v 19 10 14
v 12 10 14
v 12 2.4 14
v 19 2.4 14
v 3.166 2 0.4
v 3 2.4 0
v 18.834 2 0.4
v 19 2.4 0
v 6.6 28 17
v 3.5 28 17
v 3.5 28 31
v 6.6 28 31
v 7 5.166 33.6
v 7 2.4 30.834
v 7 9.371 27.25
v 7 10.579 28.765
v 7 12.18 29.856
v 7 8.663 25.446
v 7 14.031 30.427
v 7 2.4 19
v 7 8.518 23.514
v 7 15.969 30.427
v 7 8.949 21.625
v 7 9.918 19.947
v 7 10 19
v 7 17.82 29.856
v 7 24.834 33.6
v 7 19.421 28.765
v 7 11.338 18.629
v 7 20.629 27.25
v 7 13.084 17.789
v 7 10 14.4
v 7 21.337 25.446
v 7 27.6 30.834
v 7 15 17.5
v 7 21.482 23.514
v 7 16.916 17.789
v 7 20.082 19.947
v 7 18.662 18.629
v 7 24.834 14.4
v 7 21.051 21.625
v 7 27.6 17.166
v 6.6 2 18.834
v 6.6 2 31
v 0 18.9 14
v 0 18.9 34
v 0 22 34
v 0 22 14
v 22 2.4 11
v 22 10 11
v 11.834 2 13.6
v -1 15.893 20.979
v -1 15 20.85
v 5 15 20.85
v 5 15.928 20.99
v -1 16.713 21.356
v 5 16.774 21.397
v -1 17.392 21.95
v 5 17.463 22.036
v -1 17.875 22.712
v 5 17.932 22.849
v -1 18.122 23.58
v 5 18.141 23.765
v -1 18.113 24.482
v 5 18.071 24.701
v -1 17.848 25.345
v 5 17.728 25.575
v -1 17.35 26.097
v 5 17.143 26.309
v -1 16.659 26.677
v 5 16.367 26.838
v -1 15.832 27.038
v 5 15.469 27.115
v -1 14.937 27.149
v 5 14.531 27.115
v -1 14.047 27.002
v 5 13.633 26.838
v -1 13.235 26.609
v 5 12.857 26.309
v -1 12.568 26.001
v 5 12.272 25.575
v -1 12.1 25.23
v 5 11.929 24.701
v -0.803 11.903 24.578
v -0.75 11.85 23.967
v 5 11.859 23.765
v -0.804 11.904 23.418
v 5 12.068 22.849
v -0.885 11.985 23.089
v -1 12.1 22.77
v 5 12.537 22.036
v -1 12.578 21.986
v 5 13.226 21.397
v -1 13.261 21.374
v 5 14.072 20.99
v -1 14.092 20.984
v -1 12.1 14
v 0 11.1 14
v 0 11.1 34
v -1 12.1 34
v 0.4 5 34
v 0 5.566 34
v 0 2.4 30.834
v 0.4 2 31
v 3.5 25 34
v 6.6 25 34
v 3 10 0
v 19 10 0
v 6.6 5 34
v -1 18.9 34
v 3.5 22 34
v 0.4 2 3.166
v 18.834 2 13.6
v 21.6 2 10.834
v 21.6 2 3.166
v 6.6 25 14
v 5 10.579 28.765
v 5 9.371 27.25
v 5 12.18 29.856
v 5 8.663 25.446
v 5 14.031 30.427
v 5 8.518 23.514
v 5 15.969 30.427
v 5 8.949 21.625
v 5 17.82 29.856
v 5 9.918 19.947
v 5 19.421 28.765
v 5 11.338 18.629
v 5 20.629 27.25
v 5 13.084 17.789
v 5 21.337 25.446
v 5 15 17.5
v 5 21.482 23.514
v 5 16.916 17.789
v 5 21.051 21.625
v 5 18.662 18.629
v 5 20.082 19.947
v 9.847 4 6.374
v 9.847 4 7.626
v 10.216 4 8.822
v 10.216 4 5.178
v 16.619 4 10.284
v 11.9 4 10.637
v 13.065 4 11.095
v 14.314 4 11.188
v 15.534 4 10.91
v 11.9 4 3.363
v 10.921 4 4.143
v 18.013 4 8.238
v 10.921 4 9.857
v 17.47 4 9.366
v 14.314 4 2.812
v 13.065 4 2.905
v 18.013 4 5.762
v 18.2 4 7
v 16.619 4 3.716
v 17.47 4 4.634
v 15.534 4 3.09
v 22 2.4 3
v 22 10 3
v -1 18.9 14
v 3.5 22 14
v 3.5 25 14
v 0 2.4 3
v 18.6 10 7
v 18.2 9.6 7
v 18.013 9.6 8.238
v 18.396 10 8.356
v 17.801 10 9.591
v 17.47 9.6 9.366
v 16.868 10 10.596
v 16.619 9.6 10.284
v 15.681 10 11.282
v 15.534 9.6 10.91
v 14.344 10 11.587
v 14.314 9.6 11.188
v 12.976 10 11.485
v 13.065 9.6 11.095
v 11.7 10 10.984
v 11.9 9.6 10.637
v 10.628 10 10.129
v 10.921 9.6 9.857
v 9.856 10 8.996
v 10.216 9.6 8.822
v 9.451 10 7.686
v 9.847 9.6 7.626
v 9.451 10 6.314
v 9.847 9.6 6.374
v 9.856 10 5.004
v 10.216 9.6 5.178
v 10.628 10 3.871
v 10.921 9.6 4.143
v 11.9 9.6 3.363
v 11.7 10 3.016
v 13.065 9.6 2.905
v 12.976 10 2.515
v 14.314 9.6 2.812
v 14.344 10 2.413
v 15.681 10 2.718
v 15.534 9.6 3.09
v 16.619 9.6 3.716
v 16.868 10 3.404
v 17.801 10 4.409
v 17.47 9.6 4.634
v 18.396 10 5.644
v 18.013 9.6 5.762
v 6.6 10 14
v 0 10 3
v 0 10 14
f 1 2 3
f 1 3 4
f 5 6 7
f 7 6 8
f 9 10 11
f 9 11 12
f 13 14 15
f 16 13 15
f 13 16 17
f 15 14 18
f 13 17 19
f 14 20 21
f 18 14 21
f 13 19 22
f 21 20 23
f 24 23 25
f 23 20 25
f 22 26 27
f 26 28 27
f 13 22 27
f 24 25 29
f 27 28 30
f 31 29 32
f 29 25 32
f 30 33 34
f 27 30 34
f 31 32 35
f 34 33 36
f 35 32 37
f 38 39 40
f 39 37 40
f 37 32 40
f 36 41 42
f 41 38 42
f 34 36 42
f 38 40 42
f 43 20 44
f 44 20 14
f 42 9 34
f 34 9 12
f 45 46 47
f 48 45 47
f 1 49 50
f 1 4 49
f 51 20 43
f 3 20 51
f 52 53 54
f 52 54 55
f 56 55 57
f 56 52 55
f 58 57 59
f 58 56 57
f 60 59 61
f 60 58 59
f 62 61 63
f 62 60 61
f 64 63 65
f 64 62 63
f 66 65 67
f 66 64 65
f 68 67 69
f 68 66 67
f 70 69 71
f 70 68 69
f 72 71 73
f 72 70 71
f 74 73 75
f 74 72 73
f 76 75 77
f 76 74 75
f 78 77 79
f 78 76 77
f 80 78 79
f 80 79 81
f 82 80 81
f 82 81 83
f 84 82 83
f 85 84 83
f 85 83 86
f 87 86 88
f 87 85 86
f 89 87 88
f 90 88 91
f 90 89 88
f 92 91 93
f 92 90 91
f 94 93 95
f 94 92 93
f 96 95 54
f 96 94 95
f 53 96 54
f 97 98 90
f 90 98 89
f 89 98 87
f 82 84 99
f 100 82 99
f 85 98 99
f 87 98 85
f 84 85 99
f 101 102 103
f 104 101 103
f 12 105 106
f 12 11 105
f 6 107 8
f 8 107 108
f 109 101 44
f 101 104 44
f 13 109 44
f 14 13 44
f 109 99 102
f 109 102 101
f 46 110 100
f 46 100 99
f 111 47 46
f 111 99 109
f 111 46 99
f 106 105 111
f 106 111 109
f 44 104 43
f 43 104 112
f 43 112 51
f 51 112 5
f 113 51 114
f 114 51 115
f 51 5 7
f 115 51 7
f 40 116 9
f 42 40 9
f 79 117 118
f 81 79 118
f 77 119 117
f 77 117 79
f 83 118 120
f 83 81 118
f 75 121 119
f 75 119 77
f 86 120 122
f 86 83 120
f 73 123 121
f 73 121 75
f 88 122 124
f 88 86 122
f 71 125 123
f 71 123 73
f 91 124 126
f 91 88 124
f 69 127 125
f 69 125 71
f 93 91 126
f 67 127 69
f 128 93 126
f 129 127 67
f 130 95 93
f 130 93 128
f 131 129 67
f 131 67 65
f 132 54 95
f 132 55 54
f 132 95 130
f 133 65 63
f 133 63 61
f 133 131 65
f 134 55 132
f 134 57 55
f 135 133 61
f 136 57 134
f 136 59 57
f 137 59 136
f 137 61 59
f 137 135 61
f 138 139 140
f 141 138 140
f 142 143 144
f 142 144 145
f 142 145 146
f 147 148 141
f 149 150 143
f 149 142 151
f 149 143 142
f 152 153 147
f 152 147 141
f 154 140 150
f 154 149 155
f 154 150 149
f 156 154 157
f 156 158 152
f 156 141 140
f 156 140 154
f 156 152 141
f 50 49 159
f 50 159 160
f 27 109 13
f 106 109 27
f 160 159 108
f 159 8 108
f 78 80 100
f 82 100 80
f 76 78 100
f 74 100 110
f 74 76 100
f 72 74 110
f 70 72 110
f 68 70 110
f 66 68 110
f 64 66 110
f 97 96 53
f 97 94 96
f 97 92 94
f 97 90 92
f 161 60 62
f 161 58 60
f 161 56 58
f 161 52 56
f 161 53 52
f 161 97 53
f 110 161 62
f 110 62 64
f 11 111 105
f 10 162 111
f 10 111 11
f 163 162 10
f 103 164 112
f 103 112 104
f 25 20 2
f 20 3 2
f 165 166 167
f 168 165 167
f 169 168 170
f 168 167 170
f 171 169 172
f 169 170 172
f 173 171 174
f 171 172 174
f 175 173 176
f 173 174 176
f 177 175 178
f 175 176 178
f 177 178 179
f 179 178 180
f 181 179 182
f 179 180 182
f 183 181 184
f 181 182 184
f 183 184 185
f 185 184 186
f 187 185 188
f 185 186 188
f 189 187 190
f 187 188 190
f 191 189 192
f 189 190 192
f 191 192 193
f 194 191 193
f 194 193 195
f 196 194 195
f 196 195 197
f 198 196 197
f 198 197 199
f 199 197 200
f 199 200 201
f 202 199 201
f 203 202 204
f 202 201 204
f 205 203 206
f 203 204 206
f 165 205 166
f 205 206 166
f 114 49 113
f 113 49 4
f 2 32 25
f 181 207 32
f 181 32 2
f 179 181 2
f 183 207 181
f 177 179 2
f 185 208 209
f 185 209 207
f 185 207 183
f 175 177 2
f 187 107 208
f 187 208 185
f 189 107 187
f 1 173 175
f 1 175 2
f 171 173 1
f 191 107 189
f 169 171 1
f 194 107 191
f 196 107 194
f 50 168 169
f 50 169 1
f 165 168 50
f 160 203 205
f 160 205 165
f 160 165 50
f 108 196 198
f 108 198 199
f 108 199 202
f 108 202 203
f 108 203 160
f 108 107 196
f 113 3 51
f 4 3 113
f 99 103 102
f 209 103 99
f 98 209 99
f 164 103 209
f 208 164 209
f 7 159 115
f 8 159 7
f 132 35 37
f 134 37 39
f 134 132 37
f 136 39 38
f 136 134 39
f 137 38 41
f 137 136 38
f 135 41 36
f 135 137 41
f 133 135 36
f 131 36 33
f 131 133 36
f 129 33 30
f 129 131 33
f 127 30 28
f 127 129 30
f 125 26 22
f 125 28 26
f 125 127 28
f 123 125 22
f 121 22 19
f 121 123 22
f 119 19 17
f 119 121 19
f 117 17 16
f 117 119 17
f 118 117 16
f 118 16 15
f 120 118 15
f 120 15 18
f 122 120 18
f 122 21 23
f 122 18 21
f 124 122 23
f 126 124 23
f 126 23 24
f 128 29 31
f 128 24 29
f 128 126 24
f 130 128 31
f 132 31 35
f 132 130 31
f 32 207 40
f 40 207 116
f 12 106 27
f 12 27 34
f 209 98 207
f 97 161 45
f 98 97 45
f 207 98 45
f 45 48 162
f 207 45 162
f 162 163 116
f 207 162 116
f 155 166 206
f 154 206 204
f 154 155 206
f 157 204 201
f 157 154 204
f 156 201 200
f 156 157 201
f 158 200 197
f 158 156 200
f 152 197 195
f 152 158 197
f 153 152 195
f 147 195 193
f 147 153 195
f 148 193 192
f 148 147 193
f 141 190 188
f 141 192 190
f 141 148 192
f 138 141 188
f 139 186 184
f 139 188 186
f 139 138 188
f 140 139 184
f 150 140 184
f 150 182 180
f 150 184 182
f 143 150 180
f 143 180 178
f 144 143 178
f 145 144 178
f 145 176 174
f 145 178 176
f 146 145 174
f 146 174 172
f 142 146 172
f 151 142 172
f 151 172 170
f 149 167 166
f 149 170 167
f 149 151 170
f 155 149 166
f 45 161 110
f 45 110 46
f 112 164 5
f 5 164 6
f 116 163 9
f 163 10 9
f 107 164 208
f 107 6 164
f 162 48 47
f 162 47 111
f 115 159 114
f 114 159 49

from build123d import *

# Parameters (mm, degrees)
CYLINDER_R        = 4.2
CYLINDER_DEPTH    = 10
CYLINDER001_R     = 6.5
CYLINDER001_DEPTH = 10
CYLINDER002_R     = 3.15
CYLINDER002_DEPTH = 10
BOX002_W          = 3.5
BOX002_H          = 8
BOX002_DEPTH      = 20
BOX001_W          = 7
BOX001_H          = 26
BOX001_DEPTH      = 20
CHAMFER004_SIZE   = 3
BOX003_W          = 2
BOX003_H          = 7.8
BOX003_DEPTH      = 20
CHAMFER003_SIZE   = 1
BOX_W             = 22
BOX_H             = 8
BOX_DEPTH         = 14
CHAMFER_SIZE      = 3
CHAMFER005_SIZE   = 5
CHAMFER006_SIZE   = 0.4


with BuildPart() as cylinder:
    # Cylinder → Cylinder (new body)
    with BuildSketch(Plane(origin=(14, 4, 7), x_dir=(1, 0, 0), z_dir=(0, 1, 0))):
        Circle(CYLINDER_R)
    extrude(amount=CYLINDER_DEPTH)


with BuildPart() as cylinder001:
    # Cylinder001 → Cylinder001 (new body)
    with BuildSketch(Plane(origin=(5, 15, 24), x_dir=(0, 0, -1), z_dir=(1, 0, 0))):
        Circle(CYLINDER001_R)
    extrude(amount=CYLINDER001_DEPTH)


with BuildPart() as fusion001:
    # Cylinder002 → Cylinder002 (new body)
    with BuildSketch(Plane(origin=(-2, 15, 24), x_dir=(0, 0, -1), z_dir=(1, 0, 0))):
        Circle(CYLINDER002_R)
    extrude(amount=CYLINDER002_DEPTH)

    # Fusion001: union Cylinder001
    add(cylinder001.part)


with BuildPart() as cube002:
    # Box002 → Box002 (new body)
    with BuildSketch(Plane(origin=(0, 22, 14), x_dir=(1, 0, 0), z_dir=(0, 0, 1))):
        with Locations((1.75, 4)):
            Rectangle(BOX002_W, BOX002_H)
    extrude(amount=BOX002_DEPTH)


with BuildPart() as chamfer004:
    # Box001 → Box001 (new body)
    with BuildSketch(Plane(origin=(0, 2, 14), x_dir=(1, 0, 0), z_dir=(0, 0, 1))):
        with Locations((3.5, 13)):
            Rectangle(BOX001_W, BOX001_H)
    extrude(amount=BOX001_DEPTH)

    # Cut: cut Cube002
    add(cube002.part, mode=Mode.SUBTRACT)

    # Chamfer004
    chamfer004_edges = [chamfer004.edges().sort_by_distance(p)[0] for p in [
        (5.25, 28, 34),
        (3.5, 2, 34),
        (5.25, 28, 14),
    ]]
    chamfer(chamfer004_edges, length=CHAMFER004_SIZE)


with BuildPart() as chamfer003:
    # Box003 → Box003 (new body)
    with BuildSketch(Plane(origin=(-1, 11.1, 14), x_dir=(1, 0, 0), z_dir=(0, 0, 1))):
        with Locations((1, 3.9)):
            Rectangle(BOX003_W, BOX003_H)
    extrude(amount=BOX003_DEPTH)

    # Chamfer003
    chamfer003_edges = [chamfer003.edges().sort_by_distance(p)[0] for p in [
        (-1, 11.1, 24),
    ]]
    chamfer(chamfer003_edges, length=CHAMFER003_SIZE)


with BuildPart() as chamfer006:
    # Box → Box (new body)
    with BuildSketch(Plane(origin=(0, 2, 0), x_dir=(1, 0, 0), z_dir=(0, 0, 1))):
        with Locations((11, 4)):
            Rectangle(BOX_W, BOX_H)
    extrude(amount=BOX_DEPTH)

    # Chamfer
    chamfer_edges = [chamfer006.edges().sort_by_distance(p)[0] for p in [
        (0, 6, 0),
        (22, 6, 14),
        (22, 6, 0),
    ]]
    chamfer(chamfer_edges, length=CHAMFER_SIZE)

    # Fusion: union Chamfer004, Chamfer003
    add(chamfer004.part)
    add(chamfer003.part)

    # Chamfer005
    chamfer005_edges = [chamfer006.edges().sort_by_distance(p)[0] for p in [
        (7, 6, 14),
    ]]
    chamfer(chamfer005_edges, length=CHAMFER005_SIZE)

    # Cut010011008009003016026008002: cut Fusion001
    add(fusion001.part, mode=Mode.SUBTRACT)

    # Cut010011008009003016026008003: cut Cylinder
    add(cylinder.part, mode=Mode.SUBTRACT)

    # Chamfer006
    chamfer006_edges = [chamfer006.edges().sort_by_distance(p)[0] for p in [
        (15.5, 2, 14),
        (20.5, 2, 12.5),
        (22, 2, 7),
        (20.5, 2, 1.5),
        (11, 2, 0),
        (1.5, 2, 1.5),
        (9.8, 10, 7),
        (9.5, 2, 16.5),
        (7, 2, 25),
        (7, 3.5, 32.5),
        (7, 15, 34),
        (7, 17.5, 14),
        (7, 26.5, 32.5),
        (7, 26.5, 15.5),
        (7, 28, 24),
        (0, 3.5, 32.5),
        (0, 2, 17),
    ]]
    chamfer(chamfer006_edges, length=CHAMFER006_SIZE)


solid = chamfer006.part
